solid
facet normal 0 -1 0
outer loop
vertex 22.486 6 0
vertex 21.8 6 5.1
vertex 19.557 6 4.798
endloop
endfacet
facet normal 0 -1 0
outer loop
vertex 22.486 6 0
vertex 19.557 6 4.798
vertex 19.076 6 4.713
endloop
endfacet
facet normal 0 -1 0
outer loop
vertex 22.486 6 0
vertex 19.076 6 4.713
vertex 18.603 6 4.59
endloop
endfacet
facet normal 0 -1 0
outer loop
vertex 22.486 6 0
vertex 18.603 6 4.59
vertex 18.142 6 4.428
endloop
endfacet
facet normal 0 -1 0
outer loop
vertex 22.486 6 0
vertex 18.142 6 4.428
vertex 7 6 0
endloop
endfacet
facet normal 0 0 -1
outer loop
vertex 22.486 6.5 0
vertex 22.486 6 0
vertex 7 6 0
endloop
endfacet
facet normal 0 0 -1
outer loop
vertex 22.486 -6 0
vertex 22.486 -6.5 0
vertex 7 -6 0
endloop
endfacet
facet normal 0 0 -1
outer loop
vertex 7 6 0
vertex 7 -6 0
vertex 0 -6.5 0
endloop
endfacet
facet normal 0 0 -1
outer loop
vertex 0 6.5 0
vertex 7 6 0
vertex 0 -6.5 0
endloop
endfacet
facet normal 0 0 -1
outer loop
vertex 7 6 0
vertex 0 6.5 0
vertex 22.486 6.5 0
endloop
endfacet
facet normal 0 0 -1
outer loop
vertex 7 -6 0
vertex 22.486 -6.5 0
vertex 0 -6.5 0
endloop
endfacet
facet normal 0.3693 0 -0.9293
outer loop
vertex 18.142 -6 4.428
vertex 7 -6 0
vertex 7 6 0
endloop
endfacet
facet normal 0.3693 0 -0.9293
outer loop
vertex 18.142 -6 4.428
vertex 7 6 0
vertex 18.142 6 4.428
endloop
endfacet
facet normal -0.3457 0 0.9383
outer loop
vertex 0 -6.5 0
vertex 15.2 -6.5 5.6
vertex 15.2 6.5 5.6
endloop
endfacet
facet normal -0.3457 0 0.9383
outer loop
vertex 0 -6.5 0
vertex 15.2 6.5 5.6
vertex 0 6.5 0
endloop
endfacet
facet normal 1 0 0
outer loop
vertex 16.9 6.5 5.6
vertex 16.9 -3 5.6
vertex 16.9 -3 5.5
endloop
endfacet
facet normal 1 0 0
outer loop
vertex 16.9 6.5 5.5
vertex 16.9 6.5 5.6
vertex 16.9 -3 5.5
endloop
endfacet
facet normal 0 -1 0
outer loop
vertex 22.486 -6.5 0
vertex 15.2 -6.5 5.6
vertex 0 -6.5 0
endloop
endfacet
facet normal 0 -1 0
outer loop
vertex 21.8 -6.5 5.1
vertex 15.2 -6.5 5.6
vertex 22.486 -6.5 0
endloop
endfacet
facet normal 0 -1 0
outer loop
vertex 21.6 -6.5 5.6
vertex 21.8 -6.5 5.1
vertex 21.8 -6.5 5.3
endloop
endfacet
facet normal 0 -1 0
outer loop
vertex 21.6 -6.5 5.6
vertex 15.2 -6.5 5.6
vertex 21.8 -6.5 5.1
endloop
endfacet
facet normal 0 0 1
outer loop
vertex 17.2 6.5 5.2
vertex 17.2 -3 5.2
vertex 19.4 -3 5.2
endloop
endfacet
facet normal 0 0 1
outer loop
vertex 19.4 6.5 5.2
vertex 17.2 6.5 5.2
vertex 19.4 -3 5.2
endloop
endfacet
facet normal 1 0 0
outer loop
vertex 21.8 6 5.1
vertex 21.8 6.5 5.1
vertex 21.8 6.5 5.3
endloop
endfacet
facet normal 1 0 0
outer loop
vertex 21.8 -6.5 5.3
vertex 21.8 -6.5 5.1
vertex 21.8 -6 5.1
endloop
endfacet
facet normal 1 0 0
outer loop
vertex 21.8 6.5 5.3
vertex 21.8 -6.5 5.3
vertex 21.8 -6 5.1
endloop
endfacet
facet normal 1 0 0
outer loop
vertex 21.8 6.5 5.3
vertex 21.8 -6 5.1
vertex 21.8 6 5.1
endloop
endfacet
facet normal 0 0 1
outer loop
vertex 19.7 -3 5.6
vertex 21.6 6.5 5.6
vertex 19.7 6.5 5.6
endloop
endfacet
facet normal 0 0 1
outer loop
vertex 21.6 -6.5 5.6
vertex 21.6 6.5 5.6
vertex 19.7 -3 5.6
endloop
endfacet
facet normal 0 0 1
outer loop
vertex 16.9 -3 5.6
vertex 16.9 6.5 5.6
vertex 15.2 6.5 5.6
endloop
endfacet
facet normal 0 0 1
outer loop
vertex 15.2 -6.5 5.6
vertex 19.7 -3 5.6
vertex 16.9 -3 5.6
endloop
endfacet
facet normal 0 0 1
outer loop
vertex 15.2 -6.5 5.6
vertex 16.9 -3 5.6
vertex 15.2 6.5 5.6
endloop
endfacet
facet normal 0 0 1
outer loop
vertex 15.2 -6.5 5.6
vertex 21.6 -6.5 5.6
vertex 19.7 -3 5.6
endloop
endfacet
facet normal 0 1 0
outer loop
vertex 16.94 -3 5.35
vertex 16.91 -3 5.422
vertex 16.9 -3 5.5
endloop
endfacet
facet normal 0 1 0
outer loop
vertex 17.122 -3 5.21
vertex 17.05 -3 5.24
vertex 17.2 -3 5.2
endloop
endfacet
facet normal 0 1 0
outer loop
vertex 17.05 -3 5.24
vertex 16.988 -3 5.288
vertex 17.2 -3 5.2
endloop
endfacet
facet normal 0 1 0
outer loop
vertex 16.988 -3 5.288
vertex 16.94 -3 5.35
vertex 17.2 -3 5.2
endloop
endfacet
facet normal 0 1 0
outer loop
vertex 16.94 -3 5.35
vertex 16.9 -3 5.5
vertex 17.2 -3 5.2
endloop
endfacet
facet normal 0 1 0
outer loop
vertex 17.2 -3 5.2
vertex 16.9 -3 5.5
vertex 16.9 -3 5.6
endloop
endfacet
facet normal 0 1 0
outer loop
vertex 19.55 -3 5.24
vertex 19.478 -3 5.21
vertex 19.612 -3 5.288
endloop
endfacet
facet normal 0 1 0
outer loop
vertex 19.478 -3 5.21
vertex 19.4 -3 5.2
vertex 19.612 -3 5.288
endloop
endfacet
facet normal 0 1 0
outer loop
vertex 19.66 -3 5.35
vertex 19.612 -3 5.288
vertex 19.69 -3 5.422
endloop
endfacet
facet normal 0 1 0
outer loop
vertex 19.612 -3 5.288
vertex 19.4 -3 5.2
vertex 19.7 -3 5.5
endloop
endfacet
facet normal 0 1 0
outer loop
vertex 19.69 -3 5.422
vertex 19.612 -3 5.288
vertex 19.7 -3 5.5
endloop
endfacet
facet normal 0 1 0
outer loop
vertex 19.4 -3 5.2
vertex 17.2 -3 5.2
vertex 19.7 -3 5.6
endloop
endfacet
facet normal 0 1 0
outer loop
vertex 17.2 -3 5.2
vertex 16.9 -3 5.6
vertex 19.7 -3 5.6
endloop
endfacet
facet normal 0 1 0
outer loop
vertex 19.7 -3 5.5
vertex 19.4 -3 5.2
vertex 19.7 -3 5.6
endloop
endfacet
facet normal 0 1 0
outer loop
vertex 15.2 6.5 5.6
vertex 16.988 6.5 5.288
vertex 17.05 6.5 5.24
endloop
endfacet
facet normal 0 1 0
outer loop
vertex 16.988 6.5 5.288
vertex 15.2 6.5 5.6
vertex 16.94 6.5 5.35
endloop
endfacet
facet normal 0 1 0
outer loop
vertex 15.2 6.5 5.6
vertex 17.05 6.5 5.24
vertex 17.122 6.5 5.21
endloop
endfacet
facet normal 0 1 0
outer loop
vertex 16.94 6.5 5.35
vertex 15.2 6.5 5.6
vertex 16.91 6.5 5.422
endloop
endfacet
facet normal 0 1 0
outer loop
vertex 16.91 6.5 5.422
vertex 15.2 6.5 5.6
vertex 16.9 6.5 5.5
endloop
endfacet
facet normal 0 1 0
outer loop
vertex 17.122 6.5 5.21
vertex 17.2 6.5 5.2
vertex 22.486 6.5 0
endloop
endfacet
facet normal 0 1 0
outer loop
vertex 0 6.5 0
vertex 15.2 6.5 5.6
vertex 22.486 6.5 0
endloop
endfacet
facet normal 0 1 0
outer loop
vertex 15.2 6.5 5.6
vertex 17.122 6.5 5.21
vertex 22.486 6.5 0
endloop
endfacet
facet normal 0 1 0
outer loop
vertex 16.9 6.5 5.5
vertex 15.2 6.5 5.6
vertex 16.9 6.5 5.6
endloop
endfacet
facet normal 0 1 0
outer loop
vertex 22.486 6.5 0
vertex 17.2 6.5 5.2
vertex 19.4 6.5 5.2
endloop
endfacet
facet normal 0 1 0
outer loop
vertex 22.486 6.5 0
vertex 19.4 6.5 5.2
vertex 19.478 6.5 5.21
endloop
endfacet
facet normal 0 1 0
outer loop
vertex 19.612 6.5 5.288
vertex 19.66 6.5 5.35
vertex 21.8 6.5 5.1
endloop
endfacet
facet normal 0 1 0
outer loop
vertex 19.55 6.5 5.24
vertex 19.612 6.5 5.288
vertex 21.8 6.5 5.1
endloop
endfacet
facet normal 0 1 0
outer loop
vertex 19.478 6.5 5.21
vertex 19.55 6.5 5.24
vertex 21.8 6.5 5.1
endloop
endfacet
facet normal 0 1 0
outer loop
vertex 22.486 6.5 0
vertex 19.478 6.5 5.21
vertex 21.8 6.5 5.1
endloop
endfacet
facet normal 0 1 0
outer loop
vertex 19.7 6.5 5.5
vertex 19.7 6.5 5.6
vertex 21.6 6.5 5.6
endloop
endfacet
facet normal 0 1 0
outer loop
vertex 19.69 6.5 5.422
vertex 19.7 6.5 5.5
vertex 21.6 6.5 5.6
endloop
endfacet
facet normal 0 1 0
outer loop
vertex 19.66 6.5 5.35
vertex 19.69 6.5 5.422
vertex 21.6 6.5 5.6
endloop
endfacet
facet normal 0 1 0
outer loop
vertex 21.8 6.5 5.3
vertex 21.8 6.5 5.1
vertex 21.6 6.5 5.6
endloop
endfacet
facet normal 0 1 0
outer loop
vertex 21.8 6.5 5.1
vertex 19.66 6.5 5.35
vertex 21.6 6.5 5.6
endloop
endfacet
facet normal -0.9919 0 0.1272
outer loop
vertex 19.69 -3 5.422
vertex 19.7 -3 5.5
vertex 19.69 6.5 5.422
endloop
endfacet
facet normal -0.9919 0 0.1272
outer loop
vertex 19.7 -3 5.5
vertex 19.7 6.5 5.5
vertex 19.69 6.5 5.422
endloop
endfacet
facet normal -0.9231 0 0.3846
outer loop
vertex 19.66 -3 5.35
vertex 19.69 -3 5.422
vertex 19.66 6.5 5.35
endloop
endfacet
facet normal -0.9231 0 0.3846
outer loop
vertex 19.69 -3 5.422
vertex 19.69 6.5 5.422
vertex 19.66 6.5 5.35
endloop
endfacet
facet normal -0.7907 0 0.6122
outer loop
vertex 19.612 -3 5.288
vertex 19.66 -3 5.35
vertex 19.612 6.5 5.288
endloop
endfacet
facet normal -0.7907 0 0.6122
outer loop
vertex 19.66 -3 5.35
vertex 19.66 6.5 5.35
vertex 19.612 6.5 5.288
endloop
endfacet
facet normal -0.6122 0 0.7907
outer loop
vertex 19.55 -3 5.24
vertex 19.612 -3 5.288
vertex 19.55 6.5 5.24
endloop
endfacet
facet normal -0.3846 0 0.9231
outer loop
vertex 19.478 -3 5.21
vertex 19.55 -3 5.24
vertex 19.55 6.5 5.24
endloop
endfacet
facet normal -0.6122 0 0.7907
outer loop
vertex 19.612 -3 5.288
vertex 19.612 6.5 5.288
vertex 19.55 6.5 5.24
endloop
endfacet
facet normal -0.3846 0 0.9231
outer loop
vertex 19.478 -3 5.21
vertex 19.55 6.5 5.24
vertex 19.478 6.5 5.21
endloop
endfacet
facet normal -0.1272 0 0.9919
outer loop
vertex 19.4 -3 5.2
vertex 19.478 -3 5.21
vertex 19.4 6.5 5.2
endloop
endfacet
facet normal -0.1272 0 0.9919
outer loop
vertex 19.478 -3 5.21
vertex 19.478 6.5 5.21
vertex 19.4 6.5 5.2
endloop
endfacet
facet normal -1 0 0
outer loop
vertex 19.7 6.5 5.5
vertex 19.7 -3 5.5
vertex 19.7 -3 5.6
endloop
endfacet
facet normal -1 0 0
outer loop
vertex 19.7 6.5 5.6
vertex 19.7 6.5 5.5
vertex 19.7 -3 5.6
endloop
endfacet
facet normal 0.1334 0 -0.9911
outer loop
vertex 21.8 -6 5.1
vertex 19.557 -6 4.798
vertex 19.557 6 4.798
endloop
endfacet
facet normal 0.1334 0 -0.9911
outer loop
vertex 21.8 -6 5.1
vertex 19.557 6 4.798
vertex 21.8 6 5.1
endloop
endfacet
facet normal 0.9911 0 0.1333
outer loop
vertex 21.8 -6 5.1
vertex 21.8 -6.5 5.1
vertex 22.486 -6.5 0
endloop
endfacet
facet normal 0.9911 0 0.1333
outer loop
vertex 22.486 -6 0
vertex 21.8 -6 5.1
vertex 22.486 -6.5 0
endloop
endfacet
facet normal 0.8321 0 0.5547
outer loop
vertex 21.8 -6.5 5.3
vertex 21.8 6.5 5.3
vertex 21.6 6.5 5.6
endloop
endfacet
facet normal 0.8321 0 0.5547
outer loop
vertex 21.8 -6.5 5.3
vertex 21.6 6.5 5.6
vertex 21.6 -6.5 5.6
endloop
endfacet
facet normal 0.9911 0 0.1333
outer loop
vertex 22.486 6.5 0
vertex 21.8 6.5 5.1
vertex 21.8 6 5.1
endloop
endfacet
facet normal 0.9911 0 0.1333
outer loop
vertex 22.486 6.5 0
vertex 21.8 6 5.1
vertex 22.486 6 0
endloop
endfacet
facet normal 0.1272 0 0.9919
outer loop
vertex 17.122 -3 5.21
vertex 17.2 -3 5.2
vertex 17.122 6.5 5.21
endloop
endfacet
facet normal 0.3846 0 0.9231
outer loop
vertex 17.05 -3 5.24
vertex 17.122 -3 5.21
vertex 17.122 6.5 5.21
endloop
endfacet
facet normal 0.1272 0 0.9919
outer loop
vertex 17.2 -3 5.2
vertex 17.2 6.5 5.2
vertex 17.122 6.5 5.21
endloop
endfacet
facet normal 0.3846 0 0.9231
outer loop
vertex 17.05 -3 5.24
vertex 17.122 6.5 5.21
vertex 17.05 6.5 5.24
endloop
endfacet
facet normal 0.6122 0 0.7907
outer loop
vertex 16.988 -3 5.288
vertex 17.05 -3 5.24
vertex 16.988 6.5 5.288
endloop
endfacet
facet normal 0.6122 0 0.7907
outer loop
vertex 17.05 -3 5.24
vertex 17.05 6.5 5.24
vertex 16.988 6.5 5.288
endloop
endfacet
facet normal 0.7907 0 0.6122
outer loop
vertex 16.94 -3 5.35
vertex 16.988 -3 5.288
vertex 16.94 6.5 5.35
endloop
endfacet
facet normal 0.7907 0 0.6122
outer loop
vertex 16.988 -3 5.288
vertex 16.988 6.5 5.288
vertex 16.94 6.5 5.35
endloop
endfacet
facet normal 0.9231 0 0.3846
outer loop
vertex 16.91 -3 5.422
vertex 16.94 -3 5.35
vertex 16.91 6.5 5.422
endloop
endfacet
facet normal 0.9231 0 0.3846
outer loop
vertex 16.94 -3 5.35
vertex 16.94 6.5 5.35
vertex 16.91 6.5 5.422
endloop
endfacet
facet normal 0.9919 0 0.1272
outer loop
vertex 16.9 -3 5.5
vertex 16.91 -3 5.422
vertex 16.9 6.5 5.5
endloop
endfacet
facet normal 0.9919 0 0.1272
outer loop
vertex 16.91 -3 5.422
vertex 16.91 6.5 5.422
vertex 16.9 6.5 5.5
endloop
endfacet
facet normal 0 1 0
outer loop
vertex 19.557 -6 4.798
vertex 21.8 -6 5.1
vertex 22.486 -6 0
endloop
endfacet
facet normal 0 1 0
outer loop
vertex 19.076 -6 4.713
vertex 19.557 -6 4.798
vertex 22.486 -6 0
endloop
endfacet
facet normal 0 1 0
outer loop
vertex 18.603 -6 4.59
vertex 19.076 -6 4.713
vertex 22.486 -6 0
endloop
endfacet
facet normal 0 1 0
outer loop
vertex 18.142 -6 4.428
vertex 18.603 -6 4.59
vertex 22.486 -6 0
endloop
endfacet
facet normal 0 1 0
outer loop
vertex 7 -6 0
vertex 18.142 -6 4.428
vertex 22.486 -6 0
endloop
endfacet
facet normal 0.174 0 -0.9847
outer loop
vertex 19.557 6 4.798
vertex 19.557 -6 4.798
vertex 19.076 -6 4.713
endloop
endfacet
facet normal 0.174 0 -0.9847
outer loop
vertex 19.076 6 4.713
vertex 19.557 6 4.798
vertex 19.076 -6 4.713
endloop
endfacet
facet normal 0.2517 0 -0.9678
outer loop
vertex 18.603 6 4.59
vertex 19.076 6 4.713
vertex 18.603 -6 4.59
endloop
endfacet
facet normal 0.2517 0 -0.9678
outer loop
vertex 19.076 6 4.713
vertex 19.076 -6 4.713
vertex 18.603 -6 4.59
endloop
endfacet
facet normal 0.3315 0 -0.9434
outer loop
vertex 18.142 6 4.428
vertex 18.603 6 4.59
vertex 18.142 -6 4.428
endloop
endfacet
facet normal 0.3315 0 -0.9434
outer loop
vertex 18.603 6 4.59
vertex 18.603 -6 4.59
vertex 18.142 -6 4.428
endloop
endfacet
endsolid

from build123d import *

# Parameters (mm, degrees)
F1_DEPTH      = 6.5
F2_R          = 6
F4_DEPTH      = 0.5
F6_DEPTH      = 3
F6_DEPTH_BACK = 25
F7_SIZE2      = 0.3
F7_SIZE       = 0.2
F8_R          = 0.3


# Not quite as in the source:
# - a pattern or mirror of a feature is missing from the dataset's text; its kind, count and spacing are read off the source's solid


with BuildPart() as f1:
    # F0 (on Front) → F1 (new body, symmetric)
    with BuildSketch(Plane.XZ):
        Polygon((15.2, 5.6), (0, 0), (7, 0), (18.8267862505, 4.7), (21.8, 5.1), (21.8, 5.6), align=None)
    extrude(amount=F1_DEPTH, both=True)

    # F2
    f2_edges = [f1.edges().sort_by_distance(p)[0] for p in [
        (18.826786, 0, 4.7),
    ]]
    fillet(f2_edges, radius=F2_R)

    # F3 (on face) → F4 (join)
    with BuildSketch(Plane(origin=(0, 6.5, 0), x_dir=(-1, 0, 0), z_dir=(0, 1, 0))):
        Polygon((-21.8, 5.6), (-21.8, 5.1), (-22.4861262499, 0), (0, 0), (-15.2, 5.6), align=None)
    f4 = extrude(amount=-F4_DEPTH)

    # F4_copies: F4 across plane
    add(f4.mirror(Plane(origin=(0, 0, 0), x_dir=(0, 0, -1), z_dir=(0, -1, 0))))

    # F5 (on Front) → F6 (cut, two sides)
    with BuildSketch(Plane.XZ) as f6_sk:
        Polygon((18.3, 5.6), (16.9, 5.6), (16.9, 5.2), (19.7, 5.2), (19.7, 5.6), align=None)
    extrude(amount=F6_DEPTH, mode=Mode.SUBTRACT)
    extrude(f6_sk.sketch, amount=-F6_DEPTH_BACK, mode=Mode.SUBTRACT)

    # F7
    f7_edges = [f1.edges().sort_by_distance(p)[0] for p in [
        (21.8, 0, 5.6),
    ]]
    f7_side = f1.faces().sort_by_distance((21.654206, 0, 5.6))[0]
    chamfer(f7_edges, length=F7_SIZE, length2=F7_SIZE2, reference=f7_side)

    # F8
    f8_edges = [f1.edges().sort_by_distance(p)[0] for p in [
        (16.9, 1.75, 5.2),
        (19.7, 1.75, 5.2),
    ]]
    fillet(f8_edges, radius=F8_R)


solid = f1.part
